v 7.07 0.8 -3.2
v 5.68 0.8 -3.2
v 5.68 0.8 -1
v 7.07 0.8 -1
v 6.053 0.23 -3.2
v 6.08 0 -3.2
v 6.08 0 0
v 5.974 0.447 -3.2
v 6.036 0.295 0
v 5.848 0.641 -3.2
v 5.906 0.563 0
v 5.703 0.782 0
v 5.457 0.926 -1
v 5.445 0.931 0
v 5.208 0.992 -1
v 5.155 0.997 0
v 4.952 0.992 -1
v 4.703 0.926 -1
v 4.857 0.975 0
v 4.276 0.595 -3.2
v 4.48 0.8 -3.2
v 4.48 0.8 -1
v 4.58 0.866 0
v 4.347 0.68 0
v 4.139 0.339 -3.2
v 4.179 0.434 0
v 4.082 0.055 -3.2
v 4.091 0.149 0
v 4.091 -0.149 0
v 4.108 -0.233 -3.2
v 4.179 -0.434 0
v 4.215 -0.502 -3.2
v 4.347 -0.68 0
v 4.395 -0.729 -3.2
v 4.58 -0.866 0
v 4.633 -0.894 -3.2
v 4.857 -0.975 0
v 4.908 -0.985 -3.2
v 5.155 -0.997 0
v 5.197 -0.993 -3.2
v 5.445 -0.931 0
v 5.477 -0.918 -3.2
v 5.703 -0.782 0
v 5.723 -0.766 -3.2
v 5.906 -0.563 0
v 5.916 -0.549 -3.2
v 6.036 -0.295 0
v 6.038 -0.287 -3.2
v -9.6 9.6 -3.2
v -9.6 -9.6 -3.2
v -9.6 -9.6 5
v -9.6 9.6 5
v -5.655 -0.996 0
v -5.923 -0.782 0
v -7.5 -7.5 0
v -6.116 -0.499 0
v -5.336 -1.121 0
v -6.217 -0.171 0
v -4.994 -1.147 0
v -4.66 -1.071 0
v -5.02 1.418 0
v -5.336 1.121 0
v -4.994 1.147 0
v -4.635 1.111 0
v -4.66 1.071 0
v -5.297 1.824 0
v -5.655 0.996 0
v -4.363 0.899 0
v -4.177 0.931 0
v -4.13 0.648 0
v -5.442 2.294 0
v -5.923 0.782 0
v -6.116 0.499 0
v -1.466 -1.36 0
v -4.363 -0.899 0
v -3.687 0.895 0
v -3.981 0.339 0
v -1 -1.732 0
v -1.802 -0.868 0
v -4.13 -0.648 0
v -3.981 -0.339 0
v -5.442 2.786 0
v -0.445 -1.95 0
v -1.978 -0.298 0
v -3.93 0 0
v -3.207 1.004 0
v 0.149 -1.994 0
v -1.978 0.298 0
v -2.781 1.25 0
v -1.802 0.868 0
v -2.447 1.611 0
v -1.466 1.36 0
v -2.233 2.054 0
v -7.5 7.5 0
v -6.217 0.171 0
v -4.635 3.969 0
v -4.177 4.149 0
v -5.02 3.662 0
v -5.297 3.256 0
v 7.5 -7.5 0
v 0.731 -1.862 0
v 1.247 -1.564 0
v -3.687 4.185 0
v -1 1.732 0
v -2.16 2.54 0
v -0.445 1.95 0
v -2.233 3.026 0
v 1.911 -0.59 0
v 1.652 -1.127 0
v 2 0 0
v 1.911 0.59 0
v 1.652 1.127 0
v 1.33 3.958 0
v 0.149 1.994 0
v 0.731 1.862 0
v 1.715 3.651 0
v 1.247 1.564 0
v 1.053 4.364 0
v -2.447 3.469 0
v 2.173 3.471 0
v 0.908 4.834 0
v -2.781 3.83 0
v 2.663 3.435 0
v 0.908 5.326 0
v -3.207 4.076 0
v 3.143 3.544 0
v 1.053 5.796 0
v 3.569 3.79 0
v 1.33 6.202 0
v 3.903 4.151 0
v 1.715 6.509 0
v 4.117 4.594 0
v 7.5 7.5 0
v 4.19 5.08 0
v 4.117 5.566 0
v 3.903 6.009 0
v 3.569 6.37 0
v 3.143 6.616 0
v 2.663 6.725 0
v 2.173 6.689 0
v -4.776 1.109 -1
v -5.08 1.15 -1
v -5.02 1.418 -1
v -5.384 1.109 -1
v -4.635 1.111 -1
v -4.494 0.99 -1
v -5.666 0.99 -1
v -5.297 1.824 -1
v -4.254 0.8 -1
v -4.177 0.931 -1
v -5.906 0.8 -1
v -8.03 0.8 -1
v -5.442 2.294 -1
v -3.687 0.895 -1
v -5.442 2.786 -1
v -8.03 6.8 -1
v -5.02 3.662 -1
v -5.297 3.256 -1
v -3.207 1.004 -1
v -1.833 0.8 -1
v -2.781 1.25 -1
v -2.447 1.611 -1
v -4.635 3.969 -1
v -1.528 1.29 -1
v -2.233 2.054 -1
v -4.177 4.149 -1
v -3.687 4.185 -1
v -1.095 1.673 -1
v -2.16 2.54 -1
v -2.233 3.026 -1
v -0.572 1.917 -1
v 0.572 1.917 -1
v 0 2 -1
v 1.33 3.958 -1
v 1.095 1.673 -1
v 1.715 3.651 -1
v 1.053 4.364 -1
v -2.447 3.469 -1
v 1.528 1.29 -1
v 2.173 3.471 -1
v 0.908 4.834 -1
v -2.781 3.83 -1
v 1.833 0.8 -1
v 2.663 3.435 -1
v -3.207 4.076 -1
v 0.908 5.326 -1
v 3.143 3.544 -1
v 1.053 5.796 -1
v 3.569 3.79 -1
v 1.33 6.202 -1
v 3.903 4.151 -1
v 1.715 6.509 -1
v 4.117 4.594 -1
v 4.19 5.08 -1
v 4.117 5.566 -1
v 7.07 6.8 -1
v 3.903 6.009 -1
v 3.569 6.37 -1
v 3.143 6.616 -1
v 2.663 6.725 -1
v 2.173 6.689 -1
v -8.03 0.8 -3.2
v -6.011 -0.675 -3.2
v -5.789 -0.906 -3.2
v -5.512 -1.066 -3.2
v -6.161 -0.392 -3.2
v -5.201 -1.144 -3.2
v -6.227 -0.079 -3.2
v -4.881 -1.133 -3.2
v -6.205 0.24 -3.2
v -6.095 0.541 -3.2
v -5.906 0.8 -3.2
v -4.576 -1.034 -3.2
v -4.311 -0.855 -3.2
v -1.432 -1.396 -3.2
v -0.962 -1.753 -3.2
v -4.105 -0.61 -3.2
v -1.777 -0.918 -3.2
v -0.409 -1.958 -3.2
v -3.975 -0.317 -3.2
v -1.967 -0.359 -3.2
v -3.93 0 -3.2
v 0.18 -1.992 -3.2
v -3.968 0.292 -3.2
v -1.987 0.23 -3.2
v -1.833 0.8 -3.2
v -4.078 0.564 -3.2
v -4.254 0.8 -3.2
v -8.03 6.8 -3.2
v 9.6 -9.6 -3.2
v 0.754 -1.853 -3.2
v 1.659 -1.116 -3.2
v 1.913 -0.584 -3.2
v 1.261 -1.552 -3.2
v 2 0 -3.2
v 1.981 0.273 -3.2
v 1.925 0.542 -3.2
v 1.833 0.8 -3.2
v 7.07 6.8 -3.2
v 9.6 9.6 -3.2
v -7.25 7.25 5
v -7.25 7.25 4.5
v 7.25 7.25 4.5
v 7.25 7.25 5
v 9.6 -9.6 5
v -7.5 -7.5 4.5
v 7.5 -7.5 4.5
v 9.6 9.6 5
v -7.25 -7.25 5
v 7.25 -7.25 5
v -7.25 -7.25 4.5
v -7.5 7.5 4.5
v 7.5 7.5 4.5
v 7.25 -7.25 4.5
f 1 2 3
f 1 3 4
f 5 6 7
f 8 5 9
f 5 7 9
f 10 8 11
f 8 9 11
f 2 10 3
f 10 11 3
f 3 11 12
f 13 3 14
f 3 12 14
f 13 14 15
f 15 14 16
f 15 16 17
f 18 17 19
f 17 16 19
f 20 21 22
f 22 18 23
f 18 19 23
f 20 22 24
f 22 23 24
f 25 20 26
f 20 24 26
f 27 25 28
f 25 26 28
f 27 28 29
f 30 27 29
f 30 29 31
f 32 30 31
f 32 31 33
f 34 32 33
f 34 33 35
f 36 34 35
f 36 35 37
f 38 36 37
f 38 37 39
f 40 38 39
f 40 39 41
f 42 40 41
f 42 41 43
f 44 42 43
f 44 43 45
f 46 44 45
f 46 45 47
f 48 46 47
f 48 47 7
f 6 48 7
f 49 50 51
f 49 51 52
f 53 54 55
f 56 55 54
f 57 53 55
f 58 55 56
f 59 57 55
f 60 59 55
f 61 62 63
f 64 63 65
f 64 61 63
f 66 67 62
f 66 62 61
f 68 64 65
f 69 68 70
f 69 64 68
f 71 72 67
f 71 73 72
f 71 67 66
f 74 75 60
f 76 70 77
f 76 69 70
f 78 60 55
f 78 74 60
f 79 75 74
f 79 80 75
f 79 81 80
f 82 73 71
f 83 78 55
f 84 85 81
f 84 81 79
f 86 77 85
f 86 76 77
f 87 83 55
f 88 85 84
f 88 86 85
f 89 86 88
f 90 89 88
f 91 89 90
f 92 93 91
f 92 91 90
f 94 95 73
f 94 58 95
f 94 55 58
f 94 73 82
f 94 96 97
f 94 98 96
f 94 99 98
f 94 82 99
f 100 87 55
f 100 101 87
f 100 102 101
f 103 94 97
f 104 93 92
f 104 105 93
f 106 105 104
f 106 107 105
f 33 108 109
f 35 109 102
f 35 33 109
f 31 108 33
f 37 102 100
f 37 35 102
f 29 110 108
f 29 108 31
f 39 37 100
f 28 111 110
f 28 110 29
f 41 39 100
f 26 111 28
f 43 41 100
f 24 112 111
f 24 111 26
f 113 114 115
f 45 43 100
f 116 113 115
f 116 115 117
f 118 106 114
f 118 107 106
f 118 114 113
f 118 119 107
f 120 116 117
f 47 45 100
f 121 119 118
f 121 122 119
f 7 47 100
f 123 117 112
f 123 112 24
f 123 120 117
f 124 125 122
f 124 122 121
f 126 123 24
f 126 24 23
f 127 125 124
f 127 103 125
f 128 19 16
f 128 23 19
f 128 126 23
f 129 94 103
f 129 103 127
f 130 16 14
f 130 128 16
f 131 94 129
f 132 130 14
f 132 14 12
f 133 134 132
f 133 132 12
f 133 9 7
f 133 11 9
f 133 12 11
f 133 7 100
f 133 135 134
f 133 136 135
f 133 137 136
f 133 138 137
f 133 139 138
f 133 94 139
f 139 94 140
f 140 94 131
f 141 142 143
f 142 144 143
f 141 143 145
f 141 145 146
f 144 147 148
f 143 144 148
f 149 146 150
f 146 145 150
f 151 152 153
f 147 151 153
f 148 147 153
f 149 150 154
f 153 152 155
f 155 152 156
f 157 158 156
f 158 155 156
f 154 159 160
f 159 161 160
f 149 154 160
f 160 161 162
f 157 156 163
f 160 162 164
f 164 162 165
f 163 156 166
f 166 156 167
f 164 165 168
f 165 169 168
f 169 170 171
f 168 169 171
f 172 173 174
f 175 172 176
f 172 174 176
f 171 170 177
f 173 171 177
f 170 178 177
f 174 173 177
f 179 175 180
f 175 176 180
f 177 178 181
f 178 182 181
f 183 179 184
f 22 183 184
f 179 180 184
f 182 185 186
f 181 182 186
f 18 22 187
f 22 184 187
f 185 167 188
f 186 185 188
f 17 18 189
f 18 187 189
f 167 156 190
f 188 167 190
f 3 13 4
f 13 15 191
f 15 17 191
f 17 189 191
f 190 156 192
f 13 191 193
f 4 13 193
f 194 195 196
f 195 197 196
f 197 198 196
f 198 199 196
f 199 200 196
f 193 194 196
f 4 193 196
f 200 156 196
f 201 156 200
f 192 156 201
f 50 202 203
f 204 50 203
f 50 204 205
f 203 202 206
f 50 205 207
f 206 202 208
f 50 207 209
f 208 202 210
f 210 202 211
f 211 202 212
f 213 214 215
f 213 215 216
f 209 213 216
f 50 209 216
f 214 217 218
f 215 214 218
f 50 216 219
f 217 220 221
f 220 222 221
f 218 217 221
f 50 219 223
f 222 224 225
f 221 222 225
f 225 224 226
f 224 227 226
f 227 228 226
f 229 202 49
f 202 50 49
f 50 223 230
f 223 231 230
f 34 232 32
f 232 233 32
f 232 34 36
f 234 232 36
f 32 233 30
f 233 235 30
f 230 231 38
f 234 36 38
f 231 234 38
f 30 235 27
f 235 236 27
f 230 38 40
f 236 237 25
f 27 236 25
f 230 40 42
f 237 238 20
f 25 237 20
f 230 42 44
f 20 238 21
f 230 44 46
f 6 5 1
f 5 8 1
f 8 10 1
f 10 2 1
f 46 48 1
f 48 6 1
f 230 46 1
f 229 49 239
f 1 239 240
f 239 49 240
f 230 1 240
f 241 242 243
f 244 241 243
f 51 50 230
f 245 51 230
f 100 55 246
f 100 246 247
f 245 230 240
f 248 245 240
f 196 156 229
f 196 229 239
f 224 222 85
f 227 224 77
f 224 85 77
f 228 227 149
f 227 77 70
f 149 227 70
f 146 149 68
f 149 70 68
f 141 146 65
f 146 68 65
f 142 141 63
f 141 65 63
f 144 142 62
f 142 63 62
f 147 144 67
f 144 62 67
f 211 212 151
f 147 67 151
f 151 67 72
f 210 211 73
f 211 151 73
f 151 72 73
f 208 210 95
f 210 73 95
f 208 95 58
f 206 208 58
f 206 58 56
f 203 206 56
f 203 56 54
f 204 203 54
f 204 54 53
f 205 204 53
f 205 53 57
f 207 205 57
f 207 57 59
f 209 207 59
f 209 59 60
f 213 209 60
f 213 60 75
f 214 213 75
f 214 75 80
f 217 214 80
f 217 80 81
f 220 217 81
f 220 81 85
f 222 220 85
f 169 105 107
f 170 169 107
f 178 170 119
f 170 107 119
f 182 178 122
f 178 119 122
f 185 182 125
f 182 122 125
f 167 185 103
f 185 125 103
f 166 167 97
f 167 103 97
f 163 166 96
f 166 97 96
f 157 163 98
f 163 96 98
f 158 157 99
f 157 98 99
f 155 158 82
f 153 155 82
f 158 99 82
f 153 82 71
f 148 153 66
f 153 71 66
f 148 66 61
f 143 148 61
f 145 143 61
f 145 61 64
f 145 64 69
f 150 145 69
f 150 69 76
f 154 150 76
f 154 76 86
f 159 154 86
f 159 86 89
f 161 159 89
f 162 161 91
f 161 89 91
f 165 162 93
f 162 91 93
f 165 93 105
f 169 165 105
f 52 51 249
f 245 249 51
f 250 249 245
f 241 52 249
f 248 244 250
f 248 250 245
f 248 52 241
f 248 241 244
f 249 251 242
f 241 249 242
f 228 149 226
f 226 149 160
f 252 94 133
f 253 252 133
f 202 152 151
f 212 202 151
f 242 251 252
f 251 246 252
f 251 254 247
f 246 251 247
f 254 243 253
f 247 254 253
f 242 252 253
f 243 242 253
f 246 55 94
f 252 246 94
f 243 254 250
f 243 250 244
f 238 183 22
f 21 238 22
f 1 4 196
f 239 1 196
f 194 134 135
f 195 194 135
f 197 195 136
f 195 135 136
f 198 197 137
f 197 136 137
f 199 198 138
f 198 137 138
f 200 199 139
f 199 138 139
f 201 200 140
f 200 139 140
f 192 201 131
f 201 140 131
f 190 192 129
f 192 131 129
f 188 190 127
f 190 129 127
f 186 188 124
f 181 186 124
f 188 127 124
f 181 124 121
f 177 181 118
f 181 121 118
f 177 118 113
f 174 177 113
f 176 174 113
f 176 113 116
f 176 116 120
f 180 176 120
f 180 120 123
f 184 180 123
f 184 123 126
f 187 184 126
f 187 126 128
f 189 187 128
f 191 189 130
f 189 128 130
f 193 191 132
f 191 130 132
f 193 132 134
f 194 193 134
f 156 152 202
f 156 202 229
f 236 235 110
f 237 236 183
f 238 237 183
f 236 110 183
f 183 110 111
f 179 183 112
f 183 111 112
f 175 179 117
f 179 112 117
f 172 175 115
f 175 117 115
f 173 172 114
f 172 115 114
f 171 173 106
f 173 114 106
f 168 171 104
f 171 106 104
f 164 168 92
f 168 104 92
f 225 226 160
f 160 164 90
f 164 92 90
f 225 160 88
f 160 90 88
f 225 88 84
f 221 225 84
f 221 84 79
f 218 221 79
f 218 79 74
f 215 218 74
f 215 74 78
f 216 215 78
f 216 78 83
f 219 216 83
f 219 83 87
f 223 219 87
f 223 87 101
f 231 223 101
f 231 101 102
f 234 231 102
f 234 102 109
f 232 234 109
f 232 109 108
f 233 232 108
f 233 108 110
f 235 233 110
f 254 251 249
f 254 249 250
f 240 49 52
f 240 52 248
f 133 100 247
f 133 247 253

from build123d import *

# Parameters (mm, degrees)
CIRCLE_R         = 2
EXTRUDE002_DEPTH = 3.2
CIRCLE001_R      = 1.15
EXTRUDE003_DEPTH = 3.2
CIRCLE002_R      = 1
EXTRUDE004_DEPTH = 3.2
CIRCLE003_R      = 1.65
EXTRUDE005_DEPTH = 1
CIRCLE004_R      = 1.65
EXTRUDE006_DEPTH = 1
RECTANGLE_W      = 15.1
RECTANGLE_H      = 6
EXTRUDE007_DEPTH = 2.2
RECTANGLE002_W   = 14.5
RECTANGLE002_H   = 14.5
EXTRUDE_DEPTH    = 1.1
RECTANGLE001_W   = 15
RECTANGLE001_H   = 15
EXTRUDE001_DEPTH = 4.5
BOX_W            = 19.2
BOX_H            = 19.2
BOX_DEPTH        = 8.2


with BuildPart() as extrude002:
    # Circle → Extrude002 (new body)
    with BuildSketch(Plane.XY):
        Circle(CIRCLE_R)
    extrude(amount=-EXTRUDE002_DEPTH)


with BuildPart() as extrude003:
    # Circle001 → Extrude003 (new body)
    with BuildSketch(Plane(origin=(-5.08, 0, 0), x_dir=(1, 0, 0), z_dir=(0, 0, 1))):
        Circle(CIRCLE001_R)
    extrude(amount=-EXTRUDE003_DEPTH)


with BuildPart() as extrude004:
    # Circle002 → Extrude004 (new body)
    with BuildSketch(Plane(origin=(5.08, 0, 0), x_dir=(1, 0, 0), z_dir=(0, 0, 1))):
        Circle(CIRCLE002_R)
    extrude(amount=-EXTRUDE004_DEPTH)


with BuildPart() as extrude005:
    # Circle003 → Extrude005 (new body)
    with BuildSketch(Plane(origin=(2.54, 5.08, 0), x_dir=(1, 0, 0), z_dir=(0, 0, 1))):
        Circle(CIRCLE003_R)
    extrude(amount=-EXTRUDE005_DEPTH)


with BuildPart() as extrude006:
    # Circle004 → Extrude006 (new body)
    with BuildSketch(Plane(origin=(-3.81, 2.54, 0), x_dir=(1, 0, 0), z_dir=(0, 0, 1))):
        Circle(CIRCLE004_R)
    extrude(amount=-EXTRUDE006_DEPTH)


with BuildPart() as extrude007:
    # Rectangle → Extrude007 (new body)
    with BuildSketch(Plane(origin=(-8.03, 0.8, -1), x_dir=(1, 0, 0), z_dir=(0, 0, 1))):
        with Locations((7.55, 3)):
            Rectangle(RECTANGLE_W, RECTANGLE_H)
    extrude(amount=-EXTRUDE007_DEPTH)


with BuildPart() as extrude_body:
    # Rectangle002 → Extrude (new body)
    with BuildSketch(Plane(origin=(-7.25, -7.25, 4), x_dir=(1, 0, 0), z_dir=(0, 0, 1))):
        with Locations((7.25, 7.25)):
            Rectangle(RECTANGLE002_W, RECTANGLE002_H)
    extrude(amount=EXTRUDE_DEPTH)


with BuildPart() as fusion:
    # Rectangle001 → Extrude001 (new body)
    with BuildSketch(Plane(origin=(-7.5, -7.5, 0), x_dir=(1, 0, 0), z_dir=(0, 0, 1))):
        with Locations((7.5, 7.5)):
            Rectangle(RECTANGLE001_W, RECTANGLE001_H)
    extrude(amount=EXTRUDE001_DEPTH)

    # Fusion: union Extrude002, Extrude003, Extrude004, Extrude005, Extrude006, Extrude007, Extrude body
    add(extrude002.part)
    add(extrude003.part)
    add(extrude004.part)
    add(extrude005.part)
    add(extrude006.part)
    add(extrude007.part)
    add(extrude_body.part)


with BuildPart() as cut:
    # Box → Box (new body)
    with BuildSketch(Plane(origin=(-9.6, -9.6, -3.2), x_dir=(1, 0, 0), z_dir=(0, 0, 1))):
        with Locations((9.6, 9.6)):
            Rectangle(BOX_W, BOX_H)
    extrude(amount=BOX_DEPTH)

    # Cut: cut Fusion
    add(fusion.part, mode=Mode.SUBTRACT)


solid = cut.part
